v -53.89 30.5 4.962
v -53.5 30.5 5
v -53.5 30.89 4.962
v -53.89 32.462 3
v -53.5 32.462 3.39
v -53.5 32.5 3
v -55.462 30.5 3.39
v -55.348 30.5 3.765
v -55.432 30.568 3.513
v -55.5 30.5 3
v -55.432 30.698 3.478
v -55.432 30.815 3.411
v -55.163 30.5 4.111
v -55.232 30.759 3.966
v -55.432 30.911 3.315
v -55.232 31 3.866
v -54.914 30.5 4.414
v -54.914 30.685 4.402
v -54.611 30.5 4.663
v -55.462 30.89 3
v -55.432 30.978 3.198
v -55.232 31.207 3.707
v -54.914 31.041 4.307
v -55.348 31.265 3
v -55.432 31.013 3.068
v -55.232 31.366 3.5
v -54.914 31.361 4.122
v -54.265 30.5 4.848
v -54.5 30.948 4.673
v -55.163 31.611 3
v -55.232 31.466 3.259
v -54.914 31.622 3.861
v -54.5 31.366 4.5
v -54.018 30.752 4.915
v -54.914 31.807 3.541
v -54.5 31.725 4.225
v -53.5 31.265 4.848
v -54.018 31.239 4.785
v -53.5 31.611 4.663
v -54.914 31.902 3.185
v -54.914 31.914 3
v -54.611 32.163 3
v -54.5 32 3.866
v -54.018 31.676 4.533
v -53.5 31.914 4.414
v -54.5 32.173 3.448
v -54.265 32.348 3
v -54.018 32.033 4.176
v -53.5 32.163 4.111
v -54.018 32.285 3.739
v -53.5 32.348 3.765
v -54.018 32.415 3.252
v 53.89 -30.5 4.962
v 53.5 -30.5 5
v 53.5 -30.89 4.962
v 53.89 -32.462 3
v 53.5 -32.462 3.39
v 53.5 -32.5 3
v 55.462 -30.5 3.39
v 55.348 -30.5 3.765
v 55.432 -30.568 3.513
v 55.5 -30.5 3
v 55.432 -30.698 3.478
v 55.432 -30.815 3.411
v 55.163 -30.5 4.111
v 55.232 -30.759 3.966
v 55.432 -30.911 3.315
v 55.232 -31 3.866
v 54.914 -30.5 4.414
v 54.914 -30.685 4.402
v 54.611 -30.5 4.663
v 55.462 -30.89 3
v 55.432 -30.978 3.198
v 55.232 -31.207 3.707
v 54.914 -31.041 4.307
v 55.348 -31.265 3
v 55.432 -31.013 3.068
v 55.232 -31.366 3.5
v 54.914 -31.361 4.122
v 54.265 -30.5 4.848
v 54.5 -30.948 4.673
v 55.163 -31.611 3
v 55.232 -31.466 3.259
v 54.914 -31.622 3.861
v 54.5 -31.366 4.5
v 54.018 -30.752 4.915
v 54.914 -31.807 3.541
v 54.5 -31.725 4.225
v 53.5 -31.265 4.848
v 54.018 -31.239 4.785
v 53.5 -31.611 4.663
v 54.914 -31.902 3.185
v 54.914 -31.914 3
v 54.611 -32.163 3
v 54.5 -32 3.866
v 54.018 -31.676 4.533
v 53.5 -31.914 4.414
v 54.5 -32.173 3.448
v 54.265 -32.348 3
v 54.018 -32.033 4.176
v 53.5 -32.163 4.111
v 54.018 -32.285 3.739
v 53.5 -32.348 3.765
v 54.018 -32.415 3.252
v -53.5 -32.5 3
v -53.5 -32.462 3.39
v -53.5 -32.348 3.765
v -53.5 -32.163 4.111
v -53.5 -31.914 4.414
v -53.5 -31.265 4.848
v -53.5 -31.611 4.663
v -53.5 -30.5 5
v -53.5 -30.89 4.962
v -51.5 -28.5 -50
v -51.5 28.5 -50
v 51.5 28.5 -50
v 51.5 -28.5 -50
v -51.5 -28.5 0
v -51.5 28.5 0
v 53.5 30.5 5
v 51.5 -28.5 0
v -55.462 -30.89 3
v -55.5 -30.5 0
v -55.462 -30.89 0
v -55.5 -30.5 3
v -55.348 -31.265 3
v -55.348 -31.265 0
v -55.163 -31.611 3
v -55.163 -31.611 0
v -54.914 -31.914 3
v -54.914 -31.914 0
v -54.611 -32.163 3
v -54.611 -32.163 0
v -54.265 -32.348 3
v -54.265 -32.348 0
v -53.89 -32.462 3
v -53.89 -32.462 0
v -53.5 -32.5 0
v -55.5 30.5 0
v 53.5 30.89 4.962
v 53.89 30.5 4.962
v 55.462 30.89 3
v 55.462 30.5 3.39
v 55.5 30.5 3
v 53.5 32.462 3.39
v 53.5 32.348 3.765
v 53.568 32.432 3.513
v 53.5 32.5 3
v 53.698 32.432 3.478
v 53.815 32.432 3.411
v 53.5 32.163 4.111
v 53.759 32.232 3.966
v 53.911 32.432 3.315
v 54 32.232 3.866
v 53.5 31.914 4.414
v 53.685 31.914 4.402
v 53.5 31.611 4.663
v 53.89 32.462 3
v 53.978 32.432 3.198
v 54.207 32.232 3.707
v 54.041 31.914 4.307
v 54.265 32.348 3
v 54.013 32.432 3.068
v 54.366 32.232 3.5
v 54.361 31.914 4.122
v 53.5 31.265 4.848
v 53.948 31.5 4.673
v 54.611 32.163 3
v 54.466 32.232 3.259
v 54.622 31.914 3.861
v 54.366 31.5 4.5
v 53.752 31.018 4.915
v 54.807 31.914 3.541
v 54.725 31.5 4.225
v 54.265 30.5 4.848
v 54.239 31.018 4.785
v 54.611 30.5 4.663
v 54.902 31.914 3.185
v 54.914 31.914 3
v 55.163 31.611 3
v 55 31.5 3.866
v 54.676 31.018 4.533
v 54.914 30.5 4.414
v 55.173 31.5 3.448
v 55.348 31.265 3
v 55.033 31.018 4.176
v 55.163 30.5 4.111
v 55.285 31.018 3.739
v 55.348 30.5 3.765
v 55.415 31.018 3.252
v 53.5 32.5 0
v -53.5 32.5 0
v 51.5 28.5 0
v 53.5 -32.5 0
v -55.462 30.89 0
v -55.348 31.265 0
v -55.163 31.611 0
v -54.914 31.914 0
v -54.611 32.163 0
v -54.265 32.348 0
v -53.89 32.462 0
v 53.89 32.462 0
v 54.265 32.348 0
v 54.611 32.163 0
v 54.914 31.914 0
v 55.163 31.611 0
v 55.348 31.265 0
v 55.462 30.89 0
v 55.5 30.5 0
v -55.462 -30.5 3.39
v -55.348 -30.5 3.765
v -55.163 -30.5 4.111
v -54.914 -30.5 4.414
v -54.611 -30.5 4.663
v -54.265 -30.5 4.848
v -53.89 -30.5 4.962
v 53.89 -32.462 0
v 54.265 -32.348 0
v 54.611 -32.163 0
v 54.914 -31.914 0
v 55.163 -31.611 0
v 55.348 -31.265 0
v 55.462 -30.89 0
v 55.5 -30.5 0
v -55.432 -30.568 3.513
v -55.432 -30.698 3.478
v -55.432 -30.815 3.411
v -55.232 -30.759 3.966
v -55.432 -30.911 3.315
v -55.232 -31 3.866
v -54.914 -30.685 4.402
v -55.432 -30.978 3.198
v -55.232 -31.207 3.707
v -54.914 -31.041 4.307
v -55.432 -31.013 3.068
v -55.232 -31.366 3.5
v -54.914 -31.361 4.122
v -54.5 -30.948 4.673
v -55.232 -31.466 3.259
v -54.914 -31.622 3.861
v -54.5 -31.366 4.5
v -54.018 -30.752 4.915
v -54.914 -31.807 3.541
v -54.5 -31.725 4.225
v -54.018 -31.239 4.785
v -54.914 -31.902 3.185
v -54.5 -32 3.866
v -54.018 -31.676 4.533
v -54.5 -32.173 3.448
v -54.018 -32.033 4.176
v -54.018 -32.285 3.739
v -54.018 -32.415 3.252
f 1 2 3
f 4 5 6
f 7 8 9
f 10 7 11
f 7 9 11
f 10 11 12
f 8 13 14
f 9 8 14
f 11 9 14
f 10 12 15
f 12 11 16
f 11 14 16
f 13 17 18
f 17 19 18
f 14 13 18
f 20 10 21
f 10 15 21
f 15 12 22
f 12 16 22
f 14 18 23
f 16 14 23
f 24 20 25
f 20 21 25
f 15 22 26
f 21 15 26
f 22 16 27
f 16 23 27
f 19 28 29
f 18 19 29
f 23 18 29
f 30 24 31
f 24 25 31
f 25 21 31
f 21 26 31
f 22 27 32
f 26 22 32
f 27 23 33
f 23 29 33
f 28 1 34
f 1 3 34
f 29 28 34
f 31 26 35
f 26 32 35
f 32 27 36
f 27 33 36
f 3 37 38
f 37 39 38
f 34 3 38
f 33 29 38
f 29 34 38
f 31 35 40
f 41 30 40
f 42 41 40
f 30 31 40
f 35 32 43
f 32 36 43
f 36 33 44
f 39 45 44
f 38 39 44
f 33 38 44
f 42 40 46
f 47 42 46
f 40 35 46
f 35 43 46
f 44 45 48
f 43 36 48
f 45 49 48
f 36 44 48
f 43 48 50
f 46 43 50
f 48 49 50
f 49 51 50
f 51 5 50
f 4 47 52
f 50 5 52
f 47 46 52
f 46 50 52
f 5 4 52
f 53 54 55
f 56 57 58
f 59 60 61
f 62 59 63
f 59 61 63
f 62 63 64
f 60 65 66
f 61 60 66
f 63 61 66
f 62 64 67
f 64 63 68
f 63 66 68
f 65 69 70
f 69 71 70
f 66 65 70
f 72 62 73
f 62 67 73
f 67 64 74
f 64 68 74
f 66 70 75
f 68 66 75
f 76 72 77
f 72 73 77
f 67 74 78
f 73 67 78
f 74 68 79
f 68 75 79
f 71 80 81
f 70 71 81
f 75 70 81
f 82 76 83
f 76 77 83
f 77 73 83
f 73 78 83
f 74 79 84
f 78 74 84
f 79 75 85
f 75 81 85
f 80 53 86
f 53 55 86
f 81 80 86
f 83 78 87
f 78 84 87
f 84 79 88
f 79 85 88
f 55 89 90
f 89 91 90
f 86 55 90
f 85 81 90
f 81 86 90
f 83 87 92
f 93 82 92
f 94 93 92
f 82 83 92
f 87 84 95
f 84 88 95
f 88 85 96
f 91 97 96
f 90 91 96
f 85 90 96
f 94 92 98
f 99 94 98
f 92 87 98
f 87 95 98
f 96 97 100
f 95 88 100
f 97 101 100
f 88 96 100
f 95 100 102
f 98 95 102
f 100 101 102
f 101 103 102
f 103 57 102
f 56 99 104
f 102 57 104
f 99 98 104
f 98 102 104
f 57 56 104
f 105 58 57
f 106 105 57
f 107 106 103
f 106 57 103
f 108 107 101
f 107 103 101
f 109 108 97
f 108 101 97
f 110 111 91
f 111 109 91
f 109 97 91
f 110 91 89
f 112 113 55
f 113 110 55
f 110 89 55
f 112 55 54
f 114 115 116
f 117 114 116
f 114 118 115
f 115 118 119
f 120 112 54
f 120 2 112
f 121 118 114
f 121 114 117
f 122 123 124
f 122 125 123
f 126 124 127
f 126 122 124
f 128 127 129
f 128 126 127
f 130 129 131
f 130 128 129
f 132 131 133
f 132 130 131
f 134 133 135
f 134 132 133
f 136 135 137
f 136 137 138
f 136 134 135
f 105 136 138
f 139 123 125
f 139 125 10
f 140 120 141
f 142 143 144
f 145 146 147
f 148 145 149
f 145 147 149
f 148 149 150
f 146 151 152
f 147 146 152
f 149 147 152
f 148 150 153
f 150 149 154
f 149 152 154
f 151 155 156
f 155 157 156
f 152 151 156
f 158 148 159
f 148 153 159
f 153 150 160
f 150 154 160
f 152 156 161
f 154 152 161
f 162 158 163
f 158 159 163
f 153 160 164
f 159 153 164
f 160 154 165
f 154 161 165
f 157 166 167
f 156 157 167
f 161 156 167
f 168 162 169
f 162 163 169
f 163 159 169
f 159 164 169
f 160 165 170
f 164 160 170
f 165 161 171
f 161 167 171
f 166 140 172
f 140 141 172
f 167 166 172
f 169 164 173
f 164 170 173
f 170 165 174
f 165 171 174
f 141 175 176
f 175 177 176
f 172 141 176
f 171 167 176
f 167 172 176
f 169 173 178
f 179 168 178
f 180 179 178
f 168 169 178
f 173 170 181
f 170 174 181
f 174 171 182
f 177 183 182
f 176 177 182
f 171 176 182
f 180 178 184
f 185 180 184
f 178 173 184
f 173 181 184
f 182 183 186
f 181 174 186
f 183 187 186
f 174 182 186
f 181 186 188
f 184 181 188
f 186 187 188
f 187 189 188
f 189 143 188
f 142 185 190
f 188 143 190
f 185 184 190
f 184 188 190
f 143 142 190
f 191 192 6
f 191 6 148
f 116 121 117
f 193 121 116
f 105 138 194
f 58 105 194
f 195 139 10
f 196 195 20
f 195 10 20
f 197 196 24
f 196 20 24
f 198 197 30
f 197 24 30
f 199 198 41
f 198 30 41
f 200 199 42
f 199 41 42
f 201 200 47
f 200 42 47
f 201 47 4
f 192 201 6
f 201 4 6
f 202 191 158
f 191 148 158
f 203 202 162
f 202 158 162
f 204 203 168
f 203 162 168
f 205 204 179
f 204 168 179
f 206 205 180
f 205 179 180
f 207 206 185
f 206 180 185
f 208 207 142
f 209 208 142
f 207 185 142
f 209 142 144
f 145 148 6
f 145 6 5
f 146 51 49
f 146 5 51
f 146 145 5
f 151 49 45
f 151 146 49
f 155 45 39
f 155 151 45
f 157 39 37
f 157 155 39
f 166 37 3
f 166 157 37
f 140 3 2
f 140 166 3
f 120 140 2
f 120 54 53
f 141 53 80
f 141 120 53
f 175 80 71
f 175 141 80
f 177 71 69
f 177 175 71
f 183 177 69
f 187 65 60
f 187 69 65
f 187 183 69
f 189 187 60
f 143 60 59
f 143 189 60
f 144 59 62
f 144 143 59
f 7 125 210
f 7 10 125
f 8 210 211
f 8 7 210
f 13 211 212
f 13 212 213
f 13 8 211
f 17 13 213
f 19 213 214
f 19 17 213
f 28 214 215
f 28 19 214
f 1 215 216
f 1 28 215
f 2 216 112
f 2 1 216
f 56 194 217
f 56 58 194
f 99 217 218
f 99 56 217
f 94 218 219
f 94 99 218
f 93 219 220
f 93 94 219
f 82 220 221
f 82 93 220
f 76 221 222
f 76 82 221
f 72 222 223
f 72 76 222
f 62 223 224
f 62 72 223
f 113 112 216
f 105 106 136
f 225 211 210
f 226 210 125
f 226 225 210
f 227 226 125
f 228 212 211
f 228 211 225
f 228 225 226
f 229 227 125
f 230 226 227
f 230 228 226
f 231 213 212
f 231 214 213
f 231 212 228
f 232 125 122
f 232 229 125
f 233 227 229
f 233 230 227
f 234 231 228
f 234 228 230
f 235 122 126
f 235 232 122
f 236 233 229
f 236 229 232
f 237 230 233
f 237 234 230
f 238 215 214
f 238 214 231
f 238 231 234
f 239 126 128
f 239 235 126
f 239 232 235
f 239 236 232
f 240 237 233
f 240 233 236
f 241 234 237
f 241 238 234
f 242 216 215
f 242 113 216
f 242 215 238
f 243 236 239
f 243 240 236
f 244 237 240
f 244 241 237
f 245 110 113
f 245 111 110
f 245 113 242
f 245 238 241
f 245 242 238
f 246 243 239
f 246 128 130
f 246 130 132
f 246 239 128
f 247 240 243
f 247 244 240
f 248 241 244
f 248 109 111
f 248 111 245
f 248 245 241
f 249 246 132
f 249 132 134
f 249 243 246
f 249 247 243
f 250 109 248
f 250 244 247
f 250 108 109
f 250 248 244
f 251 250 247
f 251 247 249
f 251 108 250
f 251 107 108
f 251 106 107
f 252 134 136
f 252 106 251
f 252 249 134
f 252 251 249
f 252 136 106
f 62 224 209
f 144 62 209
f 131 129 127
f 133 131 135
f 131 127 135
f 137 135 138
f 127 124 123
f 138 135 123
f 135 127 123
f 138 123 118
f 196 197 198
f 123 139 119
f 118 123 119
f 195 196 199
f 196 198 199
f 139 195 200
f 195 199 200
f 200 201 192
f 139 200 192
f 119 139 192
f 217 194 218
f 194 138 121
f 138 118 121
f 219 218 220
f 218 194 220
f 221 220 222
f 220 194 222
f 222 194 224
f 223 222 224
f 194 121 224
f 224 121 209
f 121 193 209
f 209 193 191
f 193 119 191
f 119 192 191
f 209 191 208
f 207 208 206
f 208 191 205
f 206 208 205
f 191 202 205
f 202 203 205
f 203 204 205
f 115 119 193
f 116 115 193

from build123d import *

# Parameters (mm, degrees)
F0_W     = 111
F0_H     = 65
F1_DEPTH = 5
F2_W     = 103
F2_H     = 57
F3_DEPTH = 50
F4_R     = 2


with BuildPart() as f1:
    # F0 (on Top) → F1 (new body)
    with BuildSketch(Plane.XY):
        Rectangle(F0_W, F0_H)
    extrude(amount=F1_DEPTH)

    # F2 (on Top) → F3 (join)
    with BuildSketch(Plane.XY):
        Rectangle(F2_W, F2_H)
    extrude(amount=-F3_DEPTH)

    # F4
    f4_edges = [f1.edges().sort_by_distance(p)[0] for p in [
        (0, -32.5, 5),
        (55.5, 0, 5),
        (0, 32.5, 5),
        (-55.5, 0, 5),
        (-55.5, 32.5, 2.5),
        (55.5, 32.5, 2.5),
        (55.5, -32.5, 2.5),
        (-55.5, -32.5, 2.5),
    ]]
    fillet(f4_edges, radius=F4_R)


solid = f1.part
